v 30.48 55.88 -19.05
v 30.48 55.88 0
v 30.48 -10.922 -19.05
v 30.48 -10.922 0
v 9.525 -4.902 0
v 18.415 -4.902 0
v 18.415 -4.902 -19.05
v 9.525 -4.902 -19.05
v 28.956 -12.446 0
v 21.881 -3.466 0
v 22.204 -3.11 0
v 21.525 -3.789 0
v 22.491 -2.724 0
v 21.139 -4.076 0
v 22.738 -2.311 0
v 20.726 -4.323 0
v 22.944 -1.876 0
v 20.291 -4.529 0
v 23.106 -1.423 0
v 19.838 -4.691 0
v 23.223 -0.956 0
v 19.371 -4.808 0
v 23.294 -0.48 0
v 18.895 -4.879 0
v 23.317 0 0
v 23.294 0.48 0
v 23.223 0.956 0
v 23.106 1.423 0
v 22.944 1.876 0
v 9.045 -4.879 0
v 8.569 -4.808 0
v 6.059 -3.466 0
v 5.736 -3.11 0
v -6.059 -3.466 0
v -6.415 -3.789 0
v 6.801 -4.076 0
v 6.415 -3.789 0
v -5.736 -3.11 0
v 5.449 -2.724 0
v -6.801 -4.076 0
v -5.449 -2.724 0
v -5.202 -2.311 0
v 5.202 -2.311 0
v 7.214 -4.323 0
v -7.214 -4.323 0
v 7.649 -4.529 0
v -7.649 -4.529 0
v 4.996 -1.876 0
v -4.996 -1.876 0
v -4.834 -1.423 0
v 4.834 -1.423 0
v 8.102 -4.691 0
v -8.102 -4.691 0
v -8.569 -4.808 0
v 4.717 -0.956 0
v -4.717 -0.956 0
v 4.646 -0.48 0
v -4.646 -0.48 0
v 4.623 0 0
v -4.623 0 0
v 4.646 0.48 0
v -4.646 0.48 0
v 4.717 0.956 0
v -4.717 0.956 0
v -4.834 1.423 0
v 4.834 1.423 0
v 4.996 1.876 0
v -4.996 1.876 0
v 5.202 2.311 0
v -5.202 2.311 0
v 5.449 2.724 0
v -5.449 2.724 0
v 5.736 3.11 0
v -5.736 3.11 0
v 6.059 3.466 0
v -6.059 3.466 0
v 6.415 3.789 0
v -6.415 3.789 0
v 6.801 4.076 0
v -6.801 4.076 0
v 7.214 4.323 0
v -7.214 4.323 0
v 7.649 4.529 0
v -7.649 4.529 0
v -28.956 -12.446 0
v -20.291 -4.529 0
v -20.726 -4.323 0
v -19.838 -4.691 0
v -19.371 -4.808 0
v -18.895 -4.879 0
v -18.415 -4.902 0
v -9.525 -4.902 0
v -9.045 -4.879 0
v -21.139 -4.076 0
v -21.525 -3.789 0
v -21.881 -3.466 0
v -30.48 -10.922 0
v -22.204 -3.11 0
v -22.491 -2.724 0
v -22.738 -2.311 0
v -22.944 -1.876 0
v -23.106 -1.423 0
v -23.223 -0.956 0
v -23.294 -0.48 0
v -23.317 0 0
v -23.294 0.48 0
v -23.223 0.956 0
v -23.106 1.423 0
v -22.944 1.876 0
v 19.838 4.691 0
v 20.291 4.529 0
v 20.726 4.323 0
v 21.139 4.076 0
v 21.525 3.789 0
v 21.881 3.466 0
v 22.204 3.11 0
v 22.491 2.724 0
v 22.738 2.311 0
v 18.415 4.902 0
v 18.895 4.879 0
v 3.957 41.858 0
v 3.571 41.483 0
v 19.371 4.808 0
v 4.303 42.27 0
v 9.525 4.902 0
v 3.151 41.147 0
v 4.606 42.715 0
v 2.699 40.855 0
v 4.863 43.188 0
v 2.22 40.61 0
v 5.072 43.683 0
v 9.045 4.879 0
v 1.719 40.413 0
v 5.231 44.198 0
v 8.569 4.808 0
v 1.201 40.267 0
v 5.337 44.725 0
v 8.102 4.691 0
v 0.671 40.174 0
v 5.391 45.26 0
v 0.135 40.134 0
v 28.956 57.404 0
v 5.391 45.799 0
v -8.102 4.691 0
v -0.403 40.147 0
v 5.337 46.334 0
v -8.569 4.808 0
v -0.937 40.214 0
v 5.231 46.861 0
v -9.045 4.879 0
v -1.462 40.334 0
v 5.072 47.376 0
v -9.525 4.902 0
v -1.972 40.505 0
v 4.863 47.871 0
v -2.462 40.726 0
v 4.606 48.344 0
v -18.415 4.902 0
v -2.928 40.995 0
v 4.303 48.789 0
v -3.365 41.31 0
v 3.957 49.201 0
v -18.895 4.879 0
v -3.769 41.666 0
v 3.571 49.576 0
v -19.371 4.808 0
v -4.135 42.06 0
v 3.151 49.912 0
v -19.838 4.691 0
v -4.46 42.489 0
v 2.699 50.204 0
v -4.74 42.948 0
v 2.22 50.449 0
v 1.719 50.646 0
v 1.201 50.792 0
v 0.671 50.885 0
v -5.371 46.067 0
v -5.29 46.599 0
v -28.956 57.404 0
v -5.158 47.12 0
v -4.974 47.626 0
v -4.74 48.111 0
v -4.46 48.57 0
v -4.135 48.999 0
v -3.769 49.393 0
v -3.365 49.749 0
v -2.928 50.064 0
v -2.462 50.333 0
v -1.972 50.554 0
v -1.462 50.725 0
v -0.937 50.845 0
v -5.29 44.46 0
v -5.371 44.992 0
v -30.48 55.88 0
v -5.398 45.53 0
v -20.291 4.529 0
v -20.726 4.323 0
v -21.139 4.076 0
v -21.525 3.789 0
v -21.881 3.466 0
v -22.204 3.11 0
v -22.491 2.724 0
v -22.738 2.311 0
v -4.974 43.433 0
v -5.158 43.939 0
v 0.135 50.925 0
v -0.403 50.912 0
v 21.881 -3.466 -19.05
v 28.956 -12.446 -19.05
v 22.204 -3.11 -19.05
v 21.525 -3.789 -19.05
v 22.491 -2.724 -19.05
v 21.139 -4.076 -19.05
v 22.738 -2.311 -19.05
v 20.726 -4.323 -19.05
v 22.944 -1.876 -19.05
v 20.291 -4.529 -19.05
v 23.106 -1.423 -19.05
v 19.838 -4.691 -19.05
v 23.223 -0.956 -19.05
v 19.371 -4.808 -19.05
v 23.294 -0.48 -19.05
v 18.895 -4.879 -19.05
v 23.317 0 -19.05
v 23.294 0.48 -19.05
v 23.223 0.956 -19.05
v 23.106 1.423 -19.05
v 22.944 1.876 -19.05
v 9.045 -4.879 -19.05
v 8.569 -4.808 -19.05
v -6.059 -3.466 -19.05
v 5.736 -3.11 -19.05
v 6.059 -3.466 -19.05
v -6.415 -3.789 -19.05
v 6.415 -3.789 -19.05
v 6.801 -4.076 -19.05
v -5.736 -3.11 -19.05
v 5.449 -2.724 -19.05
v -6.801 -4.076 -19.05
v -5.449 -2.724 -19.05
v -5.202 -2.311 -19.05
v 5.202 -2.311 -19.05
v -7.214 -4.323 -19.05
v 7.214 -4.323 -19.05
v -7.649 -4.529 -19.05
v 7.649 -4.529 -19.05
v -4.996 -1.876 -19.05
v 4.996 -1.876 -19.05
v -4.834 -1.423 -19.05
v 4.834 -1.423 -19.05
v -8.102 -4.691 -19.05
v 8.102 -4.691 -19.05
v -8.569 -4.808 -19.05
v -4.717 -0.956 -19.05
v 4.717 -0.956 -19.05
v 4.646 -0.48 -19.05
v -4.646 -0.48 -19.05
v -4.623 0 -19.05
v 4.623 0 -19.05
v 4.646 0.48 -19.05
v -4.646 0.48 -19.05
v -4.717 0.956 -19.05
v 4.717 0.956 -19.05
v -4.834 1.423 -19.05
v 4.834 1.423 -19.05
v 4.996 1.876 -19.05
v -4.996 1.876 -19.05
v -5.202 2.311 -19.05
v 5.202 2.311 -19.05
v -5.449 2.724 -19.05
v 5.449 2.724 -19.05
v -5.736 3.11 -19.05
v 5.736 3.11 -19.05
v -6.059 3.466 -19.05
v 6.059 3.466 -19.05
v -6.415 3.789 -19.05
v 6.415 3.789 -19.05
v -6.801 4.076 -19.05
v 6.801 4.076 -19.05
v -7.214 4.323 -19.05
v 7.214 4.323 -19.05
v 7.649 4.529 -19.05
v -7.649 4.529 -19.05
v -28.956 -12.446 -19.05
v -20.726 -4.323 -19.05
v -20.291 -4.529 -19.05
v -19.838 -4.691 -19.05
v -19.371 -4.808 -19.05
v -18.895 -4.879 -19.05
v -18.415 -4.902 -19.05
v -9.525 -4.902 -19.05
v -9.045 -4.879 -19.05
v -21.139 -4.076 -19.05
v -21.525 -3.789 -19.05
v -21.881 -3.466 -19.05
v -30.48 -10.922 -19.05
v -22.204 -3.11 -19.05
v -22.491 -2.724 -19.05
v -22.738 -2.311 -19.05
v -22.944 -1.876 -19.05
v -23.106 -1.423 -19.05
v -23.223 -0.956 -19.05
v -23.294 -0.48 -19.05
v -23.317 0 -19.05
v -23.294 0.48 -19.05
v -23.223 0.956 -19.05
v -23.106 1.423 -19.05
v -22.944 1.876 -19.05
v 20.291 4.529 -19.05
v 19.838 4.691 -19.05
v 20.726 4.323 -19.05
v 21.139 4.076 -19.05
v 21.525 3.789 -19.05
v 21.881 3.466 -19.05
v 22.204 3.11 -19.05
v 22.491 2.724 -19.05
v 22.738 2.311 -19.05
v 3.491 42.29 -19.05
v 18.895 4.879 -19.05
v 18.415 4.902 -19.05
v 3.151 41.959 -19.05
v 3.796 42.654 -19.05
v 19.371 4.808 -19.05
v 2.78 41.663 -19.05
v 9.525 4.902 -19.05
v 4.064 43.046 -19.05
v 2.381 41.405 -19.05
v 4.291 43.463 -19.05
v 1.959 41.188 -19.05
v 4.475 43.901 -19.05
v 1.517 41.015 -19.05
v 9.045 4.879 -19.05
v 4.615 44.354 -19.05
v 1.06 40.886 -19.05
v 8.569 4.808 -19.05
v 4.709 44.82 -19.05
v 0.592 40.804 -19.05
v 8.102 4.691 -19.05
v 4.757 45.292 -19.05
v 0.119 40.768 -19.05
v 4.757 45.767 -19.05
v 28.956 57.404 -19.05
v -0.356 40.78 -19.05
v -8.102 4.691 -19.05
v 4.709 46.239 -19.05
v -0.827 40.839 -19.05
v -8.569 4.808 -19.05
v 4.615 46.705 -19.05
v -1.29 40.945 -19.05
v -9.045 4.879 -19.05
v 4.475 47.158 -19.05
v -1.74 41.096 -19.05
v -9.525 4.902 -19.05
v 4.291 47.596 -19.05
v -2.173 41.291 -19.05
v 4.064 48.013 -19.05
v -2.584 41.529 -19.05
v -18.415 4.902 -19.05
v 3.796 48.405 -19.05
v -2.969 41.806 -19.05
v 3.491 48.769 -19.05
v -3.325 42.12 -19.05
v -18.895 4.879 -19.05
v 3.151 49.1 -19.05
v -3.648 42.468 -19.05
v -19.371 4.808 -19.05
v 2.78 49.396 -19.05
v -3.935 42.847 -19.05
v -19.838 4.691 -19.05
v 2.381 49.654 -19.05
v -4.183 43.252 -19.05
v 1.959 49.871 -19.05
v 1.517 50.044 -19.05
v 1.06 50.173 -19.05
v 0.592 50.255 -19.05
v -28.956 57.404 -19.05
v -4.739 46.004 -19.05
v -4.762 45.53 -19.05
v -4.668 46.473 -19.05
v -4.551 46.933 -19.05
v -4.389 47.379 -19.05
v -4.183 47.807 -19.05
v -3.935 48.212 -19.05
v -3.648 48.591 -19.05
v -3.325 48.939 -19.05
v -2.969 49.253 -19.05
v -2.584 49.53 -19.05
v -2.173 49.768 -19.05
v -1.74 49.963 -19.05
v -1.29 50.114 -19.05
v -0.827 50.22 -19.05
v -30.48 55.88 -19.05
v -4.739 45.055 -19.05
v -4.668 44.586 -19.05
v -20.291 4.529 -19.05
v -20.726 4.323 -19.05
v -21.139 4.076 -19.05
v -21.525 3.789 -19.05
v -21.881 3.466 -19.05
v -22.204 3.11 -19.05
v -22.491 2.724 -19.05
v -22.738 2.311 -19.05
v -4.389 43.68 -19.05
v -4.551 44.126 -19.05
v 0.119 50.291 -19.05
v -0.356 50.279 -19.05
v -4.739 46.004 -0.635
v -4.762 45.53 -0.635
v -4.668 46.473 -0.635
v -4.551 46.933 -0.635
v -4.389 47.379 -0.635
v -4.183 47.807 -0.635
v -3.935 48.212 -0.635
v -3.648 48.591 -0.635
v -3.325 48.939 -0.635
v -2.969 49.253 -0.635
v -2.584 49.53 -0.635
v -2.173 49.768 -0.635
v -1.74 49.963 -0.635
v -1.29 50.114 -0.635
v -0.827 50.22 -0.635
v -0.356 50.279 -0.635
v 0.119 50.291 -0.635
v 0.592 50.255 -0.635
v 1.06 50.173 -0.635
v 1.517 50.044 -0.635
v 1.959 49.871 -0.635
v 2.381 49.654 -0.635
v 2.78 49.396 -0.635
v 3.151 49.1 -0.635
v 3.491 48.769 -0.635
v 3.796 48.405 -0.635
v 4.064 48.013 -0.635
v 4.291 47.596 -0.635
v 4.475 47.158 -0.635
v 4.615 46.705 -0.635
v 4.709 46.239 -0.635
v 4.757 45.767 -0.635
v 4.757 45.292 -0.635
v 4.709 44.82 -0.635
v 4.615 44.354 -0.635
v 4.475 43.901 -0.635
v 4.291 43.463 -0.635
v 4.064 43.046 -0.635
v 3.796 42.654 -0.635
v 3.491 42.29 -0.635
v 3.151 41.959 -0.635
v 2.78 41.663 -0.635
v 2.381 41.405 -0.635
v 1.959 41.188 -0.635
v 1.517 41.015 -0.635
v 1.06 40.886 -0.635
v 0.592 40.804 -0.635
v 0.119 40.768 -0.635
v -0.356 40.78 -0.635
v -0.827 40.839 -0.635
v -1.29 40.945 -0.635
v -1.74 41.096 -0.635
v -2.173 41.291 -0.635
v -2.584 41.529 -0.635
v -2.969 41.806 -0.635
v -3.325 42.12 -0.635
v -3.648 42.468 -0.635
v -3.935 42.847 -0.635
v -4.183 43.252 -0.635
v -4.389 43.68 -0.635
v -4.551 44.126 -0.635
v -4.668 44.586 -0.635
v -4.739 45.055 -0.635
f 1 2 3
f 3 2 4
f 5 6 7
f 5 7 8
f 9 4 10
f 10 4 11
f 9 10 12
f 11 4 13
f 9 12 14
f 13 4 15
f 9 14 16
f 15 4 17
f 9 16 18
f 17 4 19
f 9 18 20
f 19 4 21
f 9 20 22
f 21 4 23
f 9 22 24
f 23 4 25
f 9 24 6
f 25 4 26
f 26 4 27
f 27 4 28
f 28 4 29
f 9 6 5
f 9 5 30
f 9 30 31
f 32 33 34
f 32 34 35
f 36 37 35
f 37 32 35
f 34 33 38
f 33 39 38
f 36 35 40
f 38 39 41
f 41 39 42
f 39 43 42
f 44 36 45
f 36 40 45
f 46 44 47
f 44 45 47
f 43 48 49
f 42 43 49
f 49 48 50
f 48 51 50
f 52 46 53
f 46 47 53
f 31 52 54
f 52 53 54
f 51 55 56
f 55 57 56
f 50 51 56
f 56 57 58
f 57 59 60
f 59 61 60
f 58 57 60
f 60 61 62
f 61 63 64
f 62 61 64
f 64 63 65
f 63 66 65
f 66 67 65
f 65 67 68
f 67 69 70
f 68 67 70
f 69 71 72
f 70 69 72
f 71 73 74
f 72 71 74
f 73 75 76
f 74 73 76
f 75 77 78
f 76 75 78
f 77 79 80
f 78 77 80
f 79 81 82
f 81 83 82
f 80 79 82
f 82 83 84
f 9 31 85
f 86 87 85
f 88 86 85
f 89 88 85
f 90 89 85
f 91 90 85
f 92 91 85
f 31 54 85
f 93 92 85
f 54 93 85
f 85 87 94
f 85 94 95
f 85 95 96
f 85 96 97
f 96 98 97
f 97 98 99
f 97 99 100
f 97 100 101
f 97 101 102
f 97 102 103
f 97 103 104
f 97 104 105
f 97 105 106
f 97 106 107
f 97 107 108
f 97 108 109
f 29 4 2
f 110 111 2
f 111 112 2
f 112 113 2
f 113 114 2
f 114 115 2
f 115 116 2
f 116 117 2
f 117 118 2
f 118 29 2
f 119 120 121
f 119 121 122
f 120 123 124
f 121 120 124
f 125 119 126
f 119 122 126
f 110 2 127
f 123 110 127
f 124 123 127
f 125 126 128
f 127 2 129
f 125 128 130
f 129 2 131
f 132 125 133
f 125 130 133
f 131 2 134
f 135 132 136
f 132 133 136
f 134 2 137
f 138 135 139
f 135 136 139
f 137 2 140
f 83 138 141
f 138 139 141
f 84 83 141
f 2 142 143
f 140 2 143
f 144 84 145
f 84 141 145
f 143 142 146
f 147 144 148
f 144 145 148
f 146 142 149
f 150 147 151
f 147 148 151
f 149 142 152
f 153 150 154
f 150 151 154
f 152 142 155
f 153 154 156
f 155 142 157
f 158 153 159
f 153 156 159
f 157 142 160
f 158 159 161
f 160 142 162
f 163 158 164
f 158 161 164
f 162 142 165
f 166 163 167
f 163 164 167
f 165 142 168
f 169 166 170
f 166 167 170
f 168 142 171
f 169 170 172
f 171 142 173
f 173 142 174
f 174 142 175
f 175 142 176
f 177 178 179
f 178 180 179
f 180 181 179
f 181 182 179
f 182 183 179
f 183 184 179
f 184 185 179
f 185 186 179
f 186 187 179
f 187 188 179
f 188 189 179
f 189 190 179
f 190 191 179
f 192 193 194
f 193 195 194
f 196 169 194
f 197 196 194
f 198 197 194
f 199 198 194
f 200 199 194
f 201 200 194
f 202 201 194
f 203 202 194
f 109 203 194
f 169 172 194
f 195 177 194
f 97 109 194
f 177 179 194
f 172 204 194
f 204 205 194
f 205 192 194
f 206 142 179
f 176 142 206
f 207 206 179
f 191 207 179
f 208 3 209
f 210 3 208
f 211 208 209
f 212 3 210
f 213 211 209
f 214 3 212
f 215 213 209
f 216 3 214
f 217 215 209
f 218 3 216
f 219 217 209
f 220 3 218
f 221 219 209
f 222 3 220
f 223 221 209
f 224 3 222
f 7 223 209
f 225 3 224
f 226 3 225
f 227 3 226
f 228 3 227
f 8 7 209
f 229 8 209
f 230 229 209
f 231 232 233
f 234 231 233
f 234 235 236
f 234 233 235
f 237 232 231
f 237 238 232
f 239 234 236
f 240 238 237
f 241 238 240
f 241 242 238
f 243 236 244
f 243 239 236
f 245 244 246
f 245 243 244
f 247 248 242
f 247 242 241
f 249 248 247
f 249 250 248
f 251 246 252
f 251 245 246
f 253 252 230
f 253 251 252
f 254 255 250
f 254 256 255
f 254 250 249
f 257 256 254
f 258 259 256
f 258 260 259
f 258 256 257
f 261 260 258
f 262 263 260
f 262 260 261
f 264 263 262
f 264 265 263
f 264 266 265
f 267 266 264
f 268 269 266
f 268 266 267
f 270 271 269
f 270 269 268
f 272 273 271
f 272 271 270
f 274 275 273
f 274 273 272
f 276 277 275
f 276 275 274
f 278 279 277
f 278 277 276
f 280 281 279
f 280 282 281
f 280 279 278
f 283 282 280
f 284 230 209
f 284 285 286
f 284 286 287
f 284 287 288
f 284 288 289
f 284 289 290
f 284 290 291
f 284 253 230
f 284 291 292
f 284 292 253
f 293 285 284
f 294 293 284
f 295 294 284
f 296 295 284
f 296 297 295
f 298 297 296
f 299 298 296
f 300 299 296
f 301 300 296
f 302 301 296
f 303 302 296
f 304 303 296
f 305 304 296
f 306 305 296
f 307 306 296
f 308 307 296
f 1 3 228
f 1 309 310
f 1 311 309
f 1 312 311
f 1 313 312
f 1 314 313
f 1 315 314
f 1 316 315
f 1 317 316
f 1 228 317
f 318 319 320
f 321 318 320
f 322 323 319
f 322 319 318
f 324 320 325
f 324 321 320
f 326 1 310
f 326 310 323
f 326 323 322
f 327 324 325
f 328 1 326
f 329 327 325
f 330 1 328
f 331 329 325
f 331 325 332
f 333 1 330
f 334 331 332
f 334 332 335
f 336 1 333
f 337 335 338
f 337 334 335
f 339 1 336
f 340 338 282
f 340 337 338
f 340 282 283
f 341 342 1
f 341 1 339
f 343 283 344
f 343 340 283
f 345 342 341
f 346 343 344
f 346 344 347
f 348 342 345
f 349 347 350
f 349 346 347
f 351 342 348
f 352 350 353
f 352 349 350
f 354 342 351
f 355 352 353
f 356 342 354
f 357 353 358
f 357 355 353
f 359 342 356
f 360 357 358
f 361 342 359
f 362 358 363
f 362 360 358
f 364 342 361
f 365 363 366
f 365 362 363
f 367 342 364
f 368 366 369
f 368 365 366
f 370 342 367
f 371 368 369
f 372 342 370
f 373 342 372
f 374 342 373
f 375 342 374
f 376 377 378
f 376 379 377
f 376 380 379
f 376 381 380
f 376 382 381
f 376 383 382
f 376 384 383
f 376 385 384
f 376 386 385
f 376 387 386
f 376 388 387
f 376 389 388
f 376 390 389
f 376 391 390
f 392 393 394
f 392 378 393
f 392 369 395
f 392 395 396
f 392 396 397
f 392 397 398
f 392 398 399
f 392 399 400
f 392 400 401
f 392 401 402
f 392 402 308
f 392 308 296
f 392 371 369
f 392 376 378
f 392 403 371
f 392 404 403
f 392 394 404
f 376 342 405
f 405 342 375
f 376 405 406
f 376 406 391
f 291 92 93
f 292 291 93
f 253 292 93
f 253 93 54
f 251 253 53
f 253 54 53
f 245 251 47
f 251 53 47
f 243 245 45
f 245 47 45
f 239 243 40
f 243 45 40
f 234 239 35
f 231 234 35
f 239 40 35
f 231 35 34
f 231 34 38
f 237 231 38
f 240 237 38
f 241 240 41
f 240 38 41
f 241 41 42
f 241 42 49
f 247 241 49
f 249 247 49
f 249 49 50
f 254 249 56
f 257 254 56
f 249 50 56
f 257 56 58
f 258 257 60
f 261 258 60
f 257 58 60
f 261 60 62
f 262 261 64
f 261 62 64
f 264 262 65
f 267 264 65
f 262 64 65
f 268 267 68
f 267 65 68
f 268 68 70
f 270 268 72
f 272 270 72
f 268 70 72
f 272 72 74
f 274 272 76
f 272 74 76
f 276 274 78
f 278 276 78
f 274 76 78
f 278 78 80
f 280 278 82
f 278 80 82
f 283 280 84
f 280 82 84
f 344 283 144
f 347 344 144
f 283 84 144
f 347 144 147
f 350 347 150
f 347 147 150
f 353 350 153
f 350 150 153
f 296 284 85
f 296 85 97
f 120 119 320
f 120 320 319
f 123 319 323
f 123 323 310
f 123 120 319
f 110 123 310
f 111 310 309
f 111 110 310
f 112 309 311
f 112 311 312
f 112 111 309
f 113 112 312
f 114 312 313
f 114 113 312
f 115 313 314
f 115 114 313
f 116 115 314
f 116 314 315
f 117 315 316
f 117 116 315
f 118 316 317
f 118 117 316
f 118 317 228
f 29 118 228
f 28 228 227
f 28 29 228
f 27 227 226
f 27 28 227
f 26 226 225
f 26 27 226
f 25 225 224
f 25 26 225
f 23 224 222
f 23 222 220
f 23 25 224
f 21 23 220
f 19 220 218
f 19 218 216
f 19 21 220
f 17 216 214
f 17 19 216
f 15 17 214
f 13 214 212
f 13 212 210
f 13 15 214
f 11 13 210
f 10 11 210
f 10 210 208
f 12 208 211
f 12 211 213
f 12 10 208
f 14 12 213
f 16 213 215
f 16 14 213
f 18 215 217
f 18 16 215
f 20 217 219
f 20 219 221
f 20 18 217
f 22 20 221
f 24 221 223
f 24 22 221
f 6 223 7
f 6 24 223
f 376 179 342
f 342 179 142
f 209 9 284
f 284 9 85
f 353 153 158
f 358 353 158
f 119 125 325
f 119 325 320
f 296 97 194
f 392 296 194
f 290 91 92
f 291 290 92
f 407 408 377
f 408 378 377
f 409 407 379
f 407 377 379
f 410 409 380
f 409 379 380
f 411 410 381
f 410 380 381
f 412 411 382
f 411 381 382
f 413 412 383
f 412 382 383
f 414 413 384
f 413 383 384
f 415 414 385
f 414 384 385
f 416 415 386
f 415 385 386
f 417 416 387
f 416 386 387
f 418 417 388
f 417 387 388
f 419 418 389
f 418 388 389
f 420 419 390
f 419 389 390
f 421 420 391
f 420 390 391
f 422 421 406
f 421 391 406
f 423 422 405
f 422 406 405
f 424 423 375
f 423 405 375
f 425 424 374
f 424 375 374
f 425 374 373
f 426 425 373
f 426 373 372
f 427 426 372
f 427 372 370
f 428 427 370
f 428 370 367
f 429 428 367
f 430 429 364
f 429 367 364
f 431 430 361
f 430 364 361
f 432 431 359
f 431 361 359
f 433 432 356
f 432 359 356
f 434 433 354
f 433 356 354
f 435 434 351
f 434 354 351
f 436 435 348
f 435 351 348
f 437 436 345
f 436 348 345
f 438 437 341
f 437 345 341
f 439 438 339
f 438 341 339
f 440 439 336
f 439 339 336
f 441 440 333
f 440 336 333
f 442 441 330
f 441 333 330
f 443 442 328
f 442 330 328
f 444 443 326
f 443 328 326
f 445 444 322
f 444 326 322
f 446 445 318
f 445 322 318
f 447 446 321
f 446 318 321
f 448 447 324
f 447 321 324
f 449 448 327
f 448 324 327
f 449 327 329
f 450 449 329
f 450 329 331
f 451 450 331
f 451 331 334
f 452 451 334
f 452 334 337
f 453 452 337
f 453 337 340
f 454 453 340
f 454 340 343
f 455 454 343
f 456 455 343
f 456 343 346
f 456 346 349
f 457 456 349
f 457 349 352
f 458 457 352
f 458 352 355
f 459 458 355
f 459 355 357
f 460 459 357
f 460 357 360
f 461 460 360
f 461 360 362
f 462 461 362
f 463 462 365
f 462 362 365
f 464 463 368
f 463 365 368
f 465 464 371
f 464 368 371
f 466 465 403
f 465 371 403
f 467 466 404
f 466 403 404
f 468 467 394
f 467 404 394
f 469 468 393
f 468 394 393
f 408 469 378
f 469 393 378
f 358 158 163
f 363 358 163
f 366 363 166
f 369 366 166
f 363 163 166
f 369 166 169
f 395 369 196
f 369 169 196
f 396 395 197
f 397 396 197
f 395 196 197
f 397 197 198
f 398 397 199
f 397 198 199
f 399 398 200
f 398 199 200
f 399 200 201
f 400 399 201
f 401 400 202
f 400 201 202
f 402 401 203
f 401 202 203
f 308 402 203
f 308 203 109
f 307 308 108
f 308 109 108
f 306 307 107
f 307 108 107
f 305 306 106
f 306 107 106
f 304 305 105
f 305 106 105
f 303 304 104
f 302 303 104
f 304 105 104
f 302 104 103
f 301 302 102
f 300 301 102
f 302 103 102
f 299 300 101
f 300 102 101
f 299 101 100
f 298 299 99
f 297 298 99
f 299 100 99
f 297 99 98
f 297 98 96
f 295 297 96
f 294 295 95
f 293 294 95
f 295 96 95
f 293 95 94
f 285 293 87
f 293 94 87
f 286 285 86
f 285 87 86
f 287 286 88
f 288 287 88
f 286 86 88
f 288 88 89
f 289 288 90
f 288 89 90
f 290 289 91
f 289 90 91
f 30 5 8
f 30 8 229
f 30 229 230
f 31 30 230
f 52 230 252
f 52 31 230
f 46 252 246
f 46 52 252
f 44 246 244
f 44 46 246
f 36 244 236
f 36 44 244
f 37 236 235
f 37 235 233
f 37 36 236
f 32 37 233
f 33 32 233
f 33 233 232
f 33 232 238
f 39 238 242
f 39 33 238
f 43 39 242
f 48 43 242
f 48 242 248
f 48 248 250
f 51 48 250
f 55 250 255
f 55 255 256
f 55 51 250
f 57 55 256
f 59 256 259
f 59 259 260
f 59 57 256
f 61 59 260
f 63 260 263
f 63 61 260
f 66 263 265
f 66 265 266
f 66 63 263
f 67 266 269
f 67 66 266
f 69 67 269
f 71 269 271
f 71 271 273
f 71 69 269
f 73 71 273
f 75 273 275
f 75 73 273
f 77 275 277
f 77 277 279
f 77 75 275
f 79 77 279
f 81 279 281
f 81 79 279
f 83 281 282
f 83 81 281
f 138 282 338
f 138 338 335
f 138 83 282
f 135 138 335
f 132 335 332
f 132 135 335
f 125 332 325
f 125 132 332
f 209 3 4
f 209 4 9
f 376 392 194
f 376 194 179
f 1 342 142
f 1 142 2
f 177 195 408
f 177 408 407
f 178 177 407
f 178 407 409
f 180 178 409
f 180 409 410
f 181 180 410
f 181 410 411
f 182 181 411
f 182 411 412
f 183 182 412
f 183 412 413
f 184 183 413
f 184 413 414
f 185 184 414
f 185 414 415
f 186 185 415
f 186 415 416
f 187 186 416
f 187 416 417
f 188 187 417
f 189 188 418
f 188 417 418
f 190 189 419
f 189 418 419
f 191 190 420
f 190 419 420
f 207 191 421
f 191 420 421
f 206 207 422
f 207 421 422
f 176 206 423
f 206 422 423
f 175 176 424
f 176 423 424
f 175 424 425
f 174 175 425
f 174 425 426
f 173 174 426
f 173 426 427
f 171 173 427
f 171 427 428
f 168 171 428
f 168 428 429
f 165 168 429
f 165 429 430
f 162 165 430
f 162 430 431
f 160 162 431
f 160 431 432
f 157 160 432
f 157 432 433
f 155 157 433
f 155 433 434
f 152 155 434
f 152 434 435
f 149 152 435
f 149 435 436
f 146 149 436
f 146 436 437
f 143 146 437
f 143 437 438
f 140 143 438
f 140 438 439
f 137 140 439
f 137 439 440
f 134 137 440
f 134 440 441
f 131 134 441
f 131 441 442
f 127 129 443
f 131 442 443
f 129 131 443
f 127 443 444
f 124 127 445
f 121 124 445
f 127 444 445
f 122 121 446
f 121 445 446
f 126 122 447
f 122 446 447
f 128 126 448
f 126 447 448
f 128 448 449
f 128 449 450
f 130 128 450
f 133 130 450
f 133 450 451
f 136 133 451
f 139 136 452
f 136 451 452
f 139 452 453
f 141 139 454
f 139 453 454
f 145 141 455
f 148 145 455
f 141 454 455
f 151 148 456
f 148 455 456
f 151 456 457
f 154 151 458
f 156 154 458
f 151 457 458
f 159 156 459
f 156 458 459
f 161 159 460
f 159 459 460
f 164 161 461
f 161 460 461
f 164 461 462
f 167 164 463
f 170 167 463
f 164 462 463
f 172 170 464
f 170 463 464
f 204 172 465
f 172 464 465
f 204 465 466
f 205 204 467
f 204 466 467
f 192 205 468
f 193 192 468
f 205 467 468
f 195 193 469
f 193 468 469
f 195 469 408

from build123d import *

# Parameters (mm, degrees)
BOSS_EXTRUDE1_DEPTH               = 19.05
F_3_8_16_TAPPED_HOLE1_D           = 9.525
F_3_8_16_TAPPED_HOLE1_CSINK_D     = 10.795
F_3_8_16_TAPPED_HOLE1_CSINK_ANGLE = 90


with BuildPart() as part:
    # Sketch6 → Boss-Extrude1 (new body)
    with BuildSketch(Plane.XY):
        Polygon((-28.956, 57.404), (28.956, 57.404), (30.48, 55.88), (30.48, -10.922), (28.956, -12.446), (-28.956, -12.446), (-30.48, -10.922), (-30.48, 55.88), align=None)
        with BuildLine():
            Line((9.525, 4.9022), (18.415, 4.9022))
            ThreePointArc((18.415, 4.9022), (23.3172, 0), (18.415, -4.9022))
            Line((18.415, -4.9022), (9.525, -4.9022))
            ThreePointArc((9.525, -4.9022), (4.6228, 0), (9.525, 4.9022))
        make_face(mode=Mode.SUBTRACT)
        with BuildLine():
            Line((-9.525, 4.9022), (-18.415, 4.9022))
            ThreePointArc((-18.415, 4.9022), (-23.3172, 0), (-18.415, -4.9022))
            Line((-18.415, -4.9022), (-9.525, -4.9022))
            ThreePointArc((-9.525, -4.9022), (-4.6228, 0), (-9.525, 4.9022))
        make_face(mode=Mode.SUBTRACT)
    extrude(amount=-BOSS_EXTRUDE1_DEPTH)

    # 3/8-16 Tapped Hole1 (through all)
    with Locations(Plane.XY):
        with Locations((0, 45.5295)):
            CounterSinkHole(F_3_8_16_TAPPED_HOLE1_D / 2, F_3_8_16_TAPPED_HOLE1_CSINK_D / 2, counter_sink_angle=F_3_8_16_TAPPED_HOLE1_CSINK_ANGLE)


solid = part.part
